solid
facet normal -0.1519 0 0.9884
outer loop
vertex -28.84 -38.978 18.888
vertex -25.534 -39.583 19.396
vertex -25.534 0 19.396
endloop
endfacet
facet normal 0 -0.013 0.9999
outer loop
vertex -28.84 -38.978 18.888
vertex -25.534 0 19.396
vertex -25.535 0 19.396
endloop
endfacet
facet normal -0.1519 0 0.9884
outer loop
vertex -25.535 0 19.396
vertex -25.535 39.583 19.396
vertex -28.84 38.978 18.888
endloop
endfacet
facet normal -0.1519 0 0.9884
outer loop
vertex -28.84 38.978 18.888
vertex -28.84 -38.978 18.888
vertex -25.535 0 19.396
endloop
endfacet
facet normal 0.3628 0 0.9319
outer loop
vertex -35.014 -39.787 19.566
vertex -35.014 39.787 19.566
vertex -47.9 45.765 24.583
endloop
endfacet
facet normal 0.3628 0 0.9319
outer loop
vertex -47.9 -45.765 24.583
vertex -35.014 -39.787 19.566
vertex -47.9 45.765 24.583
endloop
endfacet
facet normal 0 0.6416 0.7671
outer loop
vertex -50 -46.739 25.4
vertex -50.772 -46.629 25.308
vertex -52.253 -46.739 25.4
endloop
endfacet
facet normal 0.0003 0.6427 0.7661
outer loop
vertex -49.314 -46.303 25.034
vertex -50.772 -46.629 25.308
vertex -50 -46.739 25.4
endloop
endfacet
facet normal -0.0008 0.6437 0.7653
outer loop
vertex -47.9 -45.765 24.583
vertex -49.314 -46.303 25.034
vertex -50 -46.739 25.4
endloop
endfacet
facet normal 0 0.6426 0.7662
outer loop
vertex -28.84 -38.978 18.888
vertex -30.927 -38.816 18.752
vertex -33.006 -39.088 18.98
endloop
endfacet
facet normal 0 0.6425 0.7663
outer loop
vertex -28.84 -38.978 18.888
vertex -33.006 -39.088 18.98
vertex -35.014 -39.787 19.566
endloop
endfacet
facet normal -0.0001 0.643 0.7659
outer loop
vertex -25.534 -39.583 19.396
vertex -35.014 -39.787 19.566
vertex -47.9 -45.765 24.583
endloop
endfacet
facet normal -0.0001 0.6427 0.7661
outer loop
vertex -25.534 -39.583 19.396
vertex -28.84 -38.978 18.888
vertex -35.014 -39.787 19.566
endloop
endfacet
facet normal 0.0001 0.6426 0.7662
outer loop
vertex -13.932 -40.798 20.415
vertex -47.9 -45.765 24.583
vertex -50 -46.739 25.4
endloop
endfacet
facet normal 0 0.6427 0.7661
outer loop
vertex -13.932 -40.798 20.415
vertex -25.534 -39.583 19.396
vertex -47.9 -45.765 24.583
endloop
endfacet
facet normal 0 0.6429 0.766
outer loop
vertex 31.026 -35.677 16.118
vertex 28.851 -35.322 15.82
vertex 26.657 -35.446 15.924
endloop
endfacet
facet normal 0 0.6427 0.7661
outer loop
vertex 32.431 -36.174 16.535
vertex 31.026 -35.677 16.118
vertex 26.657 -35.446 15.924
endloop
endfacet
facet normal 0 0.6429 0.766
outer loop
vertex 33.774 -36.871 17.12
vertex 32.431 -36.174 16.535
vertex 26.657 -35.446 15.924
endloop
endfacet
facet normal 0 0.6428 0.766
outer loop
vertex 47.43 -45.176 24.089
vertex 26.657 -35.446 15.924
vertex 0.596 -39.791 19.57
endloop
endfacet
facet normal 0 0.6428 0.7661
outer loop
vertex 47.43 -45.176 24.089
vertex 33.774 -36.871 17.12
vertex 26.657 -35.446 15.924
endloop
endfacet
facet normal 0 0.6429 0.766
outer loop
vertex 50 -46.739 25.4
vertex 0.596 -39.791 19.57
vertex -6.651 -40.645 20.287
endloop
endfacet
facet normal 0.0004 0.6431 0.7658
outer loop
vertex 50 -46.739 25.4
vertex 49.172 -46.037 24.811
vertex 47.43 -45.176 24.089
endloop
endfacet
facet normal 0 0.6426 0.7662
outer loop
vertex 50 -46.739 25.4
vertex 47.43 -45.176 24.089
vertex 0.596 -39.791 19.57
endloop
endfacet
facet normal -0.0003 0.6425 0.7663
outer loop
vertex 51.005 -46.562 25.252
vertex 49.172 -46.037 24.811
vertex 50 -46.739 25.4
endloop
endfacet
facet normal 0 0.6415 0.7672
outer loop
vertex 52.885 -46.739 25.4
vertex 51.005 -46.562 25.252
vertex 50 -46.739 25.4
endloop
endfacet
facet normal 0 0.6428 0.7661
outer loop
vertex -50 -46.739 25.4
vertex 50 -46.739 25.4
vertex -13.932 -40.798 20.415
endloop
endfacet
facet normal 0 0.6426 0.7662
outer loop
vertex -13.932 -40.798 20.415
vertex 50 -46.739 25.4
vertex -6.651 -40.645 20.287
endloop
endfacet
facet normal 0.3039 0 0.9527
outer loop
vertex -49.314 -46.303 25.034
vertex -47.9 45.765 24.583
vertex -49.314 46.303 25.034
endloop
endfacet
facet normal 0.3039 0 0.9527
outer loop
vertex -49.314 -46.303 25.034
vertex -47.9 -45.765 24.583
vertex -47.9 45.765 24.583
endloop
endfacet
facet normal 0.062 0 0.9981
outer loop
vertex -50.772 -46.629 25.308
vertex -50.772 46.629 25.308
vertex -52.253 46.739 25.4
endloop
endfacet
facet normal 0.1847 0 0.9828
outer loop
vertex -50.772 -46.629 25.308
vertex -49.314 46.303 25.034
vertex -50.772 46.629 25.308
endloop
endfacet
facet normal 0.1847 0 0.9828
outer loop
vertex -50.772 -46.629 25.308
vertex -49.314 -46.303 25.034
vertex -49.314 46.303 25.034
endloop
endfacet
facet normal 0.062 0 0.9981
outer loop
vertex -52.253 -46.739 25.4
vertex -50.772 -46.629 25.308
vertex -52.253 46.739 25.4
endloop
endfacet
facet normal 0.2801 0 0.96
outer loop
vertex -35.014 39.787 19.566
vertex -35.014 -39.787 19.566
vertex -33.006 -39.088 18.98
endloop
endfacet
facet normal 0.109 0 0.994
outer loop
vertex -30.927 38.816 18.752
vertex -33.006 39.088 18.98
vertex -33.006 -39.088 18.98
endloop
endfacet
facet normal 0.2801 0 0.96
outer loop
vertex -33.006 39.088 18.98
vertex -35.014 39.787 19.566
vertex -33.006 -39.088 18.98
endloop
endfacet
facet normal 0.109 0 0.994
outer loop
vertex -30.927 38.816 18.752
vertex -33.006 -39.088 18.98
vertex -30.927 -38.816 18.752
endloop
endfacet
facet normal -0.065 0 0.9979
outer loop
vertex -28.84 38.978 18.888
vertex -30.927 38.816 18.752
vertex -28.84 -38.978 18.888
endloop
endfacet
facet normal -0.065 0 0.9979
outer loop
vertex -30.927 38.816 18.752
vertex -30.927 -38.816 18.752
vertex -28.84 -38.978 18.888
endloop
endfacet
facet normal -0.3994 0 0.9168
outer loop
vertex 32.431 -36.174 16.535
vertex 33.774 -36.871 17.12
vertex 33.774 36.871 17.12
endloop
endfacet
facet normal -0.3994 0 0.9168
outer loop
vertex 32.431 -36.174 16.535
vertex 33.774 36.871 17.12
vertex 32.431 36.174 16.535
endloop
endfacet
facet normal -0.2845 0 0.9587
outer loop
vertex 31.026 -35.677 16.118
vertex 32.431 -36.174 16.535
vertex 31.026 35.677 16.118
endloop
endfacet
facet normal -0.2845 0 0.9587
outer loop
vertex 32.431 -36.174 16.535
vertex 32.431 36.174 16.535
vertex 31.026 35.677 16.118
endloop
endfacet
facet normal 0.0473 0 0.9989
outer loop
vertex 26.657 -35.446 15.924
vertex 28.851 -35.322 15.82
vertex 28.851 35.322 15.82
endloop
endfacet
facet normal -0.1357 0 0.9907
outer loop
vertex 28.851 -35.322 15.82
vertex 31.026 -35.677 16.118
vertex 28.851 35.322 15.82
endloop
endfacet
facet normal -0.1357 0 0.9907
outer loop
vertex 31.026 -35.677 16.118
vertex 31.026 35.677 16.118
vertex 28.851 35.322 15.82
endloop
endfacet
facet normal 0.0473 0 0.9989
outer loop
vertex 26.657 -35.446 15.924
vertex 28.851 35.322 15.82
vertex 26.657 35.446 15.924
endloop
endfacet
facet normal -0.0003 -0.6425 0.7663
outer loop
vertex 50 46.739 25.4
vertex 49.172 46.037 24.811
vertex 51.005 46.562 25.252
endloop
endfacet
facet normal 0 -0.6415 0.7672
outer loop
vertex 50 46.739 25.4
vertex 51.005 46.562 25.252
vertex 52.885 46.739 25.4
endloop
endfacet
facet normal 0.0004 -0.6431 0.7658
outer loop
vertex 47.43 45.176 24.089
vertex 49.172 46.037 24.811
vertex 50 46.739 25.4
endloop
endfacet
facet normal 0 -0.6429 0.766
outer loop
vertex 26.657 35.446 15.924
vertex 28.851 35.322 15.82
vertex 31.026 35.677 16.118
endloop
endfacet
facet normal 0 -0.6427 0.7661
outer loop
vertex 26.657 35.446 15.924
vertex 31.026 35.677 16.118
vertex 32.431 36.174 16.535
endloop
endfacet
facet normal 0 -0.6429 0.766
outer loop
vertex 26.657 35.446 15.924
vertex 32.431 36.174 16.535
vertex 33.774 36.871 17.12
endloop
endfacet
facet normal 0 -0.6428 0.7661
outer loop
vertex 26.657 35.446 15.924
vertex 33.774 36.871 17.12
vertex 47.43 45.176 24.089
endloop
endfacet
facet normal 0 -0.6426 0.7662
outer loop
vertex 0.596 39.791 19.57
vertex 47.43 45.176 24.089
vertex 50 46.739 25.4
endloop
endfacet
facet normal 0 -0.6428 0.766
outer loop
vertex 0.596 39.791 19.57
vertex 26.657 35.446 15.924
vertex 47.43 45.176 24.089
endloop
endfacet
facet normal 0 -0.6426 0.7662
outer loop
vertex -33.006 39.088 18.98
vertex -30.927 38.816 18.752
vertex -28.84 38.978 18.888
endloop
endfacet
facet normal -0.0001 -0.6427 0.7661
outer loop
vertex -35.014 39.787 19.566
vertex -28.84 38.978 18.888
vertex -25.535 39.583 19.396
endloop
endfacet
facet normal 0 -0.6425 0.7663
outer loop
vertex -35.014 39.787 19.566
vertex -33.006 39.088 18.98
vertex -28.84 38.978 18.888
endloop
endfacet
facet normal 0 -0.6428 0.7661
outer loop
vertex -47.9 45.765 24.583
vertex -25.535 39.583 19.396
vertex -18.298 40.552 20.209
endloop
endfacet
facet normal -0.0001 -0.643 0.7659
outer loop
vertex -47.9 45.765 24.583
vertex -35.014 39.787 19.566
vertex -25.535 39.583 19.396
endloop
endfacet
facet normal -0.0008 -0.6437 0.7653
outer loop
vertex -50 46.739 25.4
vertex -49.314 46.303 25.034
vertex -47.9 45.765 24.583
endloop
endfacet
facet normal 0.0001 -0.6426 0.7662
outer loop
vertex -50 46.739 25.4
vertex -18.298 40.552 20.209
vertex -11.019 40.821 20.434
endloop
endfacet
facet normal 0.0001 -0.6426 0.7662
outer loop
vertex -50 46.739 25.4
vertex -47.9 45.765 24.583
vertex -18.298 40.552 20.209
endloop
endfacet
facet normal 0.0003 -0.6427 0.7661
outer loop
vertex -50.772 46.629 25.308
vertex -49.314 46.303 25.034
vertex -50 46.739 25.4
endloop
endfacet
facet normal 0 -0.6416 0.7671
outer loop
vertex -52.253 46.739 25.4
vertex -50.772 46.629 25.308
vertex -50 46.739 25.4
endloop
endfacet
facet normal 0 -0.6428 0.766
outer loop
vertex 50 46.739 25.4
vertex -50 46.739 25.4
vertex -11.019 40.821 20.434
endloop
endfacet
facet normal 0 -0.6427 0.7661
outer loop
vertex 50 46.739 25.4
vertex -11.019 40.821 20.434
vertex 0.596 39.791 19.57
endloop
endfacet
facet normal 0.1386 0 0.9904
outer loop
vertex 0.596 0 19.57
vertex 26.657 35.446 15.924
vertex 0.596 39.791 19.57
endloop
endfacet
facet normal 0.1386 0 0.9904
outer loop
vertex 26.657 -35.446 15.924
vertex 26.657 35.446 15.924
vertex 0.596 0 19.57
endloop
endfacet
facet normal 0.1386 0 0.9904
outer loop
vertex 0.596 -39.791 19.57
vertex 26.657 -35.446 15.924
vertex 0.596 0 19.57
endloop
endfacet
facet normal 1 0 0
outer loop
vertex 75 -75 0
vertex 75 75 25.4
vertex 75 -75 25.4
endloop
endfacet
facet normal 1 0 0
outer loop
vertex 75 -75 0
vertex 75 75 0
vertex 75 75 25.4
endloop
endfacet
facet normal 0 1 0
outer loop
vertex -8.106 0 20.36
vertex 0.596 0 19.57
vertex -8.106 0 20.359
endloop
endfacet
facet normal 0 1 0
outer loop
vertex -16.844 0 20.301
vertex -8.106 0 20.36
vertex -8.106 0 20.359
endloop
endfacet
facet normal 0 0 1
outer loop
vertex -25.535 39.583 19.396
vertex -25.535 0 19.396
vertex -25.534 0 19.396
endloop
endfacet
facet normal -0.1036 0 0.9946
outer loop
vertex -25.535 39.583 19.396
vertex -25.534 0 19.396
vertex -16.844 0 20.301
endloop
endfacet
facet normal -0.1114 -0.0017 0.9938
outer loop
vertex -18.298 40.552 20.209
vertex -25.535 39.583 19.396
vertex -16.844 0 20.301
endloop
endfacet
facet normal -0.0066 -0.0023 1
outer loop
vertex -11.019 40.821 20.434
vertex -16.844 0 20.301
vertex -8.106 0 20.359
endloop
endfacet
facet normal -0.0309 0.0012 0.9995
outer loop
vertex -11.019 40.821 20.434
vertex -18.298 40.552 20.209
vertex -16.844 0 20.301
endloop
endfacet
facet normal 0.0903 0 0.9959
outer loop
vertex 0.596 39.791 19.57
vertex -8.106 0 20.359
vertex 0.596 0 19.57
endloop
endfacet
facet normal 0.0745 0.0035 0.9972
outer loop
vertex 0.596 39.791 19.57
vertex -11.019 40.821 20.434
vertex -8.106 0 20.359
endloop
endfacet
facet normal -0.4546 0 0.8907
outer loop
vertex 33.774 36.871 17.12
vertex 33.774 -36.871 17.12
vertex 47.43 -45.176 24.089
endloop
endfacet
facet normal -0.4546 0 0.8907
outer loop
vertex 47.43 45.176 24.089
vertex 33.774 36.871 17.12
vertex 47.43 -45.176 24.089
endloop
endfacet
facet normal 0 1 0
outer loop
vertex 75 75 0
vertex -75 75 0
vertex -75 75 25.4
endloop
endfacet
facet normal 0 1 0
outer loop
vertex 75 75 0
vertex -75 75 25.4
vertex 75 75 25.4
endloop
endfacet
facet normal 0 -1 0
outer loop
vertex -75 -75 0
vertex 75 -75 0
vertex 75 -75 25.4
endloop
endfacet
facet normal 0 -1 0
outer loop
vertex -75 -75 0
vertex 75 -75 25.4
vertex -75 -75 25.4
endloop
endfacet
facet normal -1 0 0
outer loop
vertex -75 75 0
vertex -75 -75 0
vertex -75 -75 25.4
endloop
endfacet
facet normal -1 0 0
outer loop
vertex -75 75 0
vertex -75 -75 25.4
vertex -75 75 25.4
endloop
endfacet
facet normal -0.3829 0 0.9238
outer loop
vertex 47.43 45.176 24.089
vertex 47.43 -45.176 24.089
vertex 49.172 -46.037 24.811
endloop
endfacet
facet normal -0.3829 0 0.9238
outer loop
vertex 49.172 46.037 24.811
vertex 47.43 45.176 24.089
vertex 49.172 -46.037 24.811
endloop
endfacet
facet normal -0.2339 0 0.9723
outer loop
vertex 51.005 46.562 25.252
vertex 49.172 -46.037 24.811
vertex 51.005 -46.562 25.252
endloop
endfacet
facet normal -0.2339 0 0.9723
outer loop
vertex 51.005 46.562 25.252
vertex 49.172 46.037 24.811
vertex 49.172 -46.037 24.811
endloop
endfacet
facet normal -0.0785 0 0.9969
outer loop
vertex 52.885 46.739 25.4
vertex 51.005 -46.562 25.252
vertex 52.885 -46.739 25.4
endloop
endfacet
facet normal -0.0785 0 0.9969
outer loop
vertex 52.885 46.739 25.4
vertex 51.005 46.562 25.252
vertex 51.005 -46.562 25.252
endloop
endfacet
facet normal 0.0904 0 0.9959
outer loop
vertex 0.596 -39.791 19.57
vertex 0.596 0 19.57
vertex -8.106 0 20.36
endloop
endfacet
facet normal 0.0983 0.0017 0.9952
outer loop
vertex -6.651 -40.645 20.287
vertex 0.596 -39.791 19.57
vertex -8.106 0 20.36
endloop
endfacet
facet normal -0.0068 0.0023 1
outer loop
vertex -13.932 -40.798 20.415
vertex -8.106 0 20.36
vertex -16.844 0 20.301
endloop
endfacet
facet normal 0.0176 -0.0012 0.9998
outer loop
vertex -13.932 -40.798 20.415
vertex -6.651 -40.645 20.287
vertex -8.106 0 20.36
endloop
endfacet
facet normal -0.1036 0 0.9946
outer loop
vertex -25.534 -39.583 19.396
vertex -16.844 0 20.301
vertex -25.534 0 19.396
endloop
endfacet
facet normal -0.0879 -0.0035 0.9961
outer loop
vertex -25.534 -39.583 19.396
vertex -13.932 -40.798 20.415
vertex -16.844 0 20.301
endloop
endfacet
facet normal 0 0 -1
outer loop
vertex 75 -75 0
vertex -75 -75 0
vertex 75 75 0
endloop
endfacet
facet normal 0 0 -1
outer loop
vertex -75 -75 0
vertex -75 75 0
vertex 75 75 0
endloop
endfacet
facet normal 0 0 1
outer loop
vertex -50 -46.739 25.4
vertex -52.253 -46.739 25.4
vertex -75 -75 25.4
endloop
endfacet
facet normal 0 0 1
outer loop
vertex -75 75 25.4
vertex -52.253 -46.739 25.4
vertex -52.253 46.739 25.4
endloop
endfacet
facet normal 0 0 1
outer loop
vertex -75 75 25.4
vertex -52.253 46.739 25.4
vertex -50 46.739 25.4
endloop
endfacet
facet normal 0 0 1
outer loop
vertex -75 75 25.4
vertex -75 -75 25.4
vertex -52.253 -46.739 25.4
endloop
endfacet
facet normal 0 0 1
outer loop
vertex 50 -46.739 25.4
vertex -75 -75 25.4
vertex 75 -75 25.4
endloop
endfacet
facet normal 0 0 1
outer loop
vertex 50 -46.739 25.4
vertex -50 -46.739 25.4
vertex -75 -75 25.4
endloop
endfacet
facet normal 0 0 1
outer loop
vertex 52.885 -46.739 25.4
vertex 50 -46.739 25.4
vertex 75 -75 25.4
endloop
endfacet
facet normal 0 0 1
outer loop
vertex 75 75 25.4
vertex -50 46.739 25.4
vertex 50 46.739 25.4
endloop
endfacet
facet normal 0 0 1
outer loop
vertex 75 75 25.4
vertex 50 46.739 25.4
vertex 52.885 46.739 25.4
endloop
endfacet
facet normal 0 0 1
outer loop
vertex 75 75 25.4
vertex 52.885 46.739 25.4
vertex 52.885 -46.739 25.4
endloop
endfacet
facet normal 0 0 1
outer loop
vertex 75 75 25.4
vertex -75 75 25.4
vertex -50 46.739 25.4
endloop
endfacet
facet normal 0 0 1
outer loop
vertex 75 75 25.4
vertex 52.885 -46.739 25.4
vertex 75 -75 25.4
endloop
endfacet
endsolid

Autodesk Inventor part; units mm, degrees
sketch "Boceto1" plane through (0, 0, 0) normal (0, 0, 1) x (1, 0, 0)
  line L0 (-75, 75) -> (75, 75)
  line L1 (75, 75) -> (75, -75)
  line L2 (75, -75) -> (-75, -75)
  line L3 (-75, -75) -> (-75, 75)
  line L4 (-75, 75) -> (75, -75) construction
  line L5 (75, 75) -> (-75, -75) construction
  point P0 (0, 0)
  dimension "d0" = 150
  dimension "d1" = 150
extrude "Extrusión1" add sketch "Boceto1" along normal blind 25.4
sketch "Boceto2" plane through (0, 0, 0) normal (0, 1, 0) x (-1, 0, 0)
  line L0 (-75, 25.4) -> (75, 25.4) projected
  line L1 (0, 25.4) -> (-45.0693, 25.4)
  line L2 (-45.0693, 25.4) -> (-30.9272, 25.4) construction
  line L3 (-30.4041, 15.4) -> (12.482, 21.4)
  line L4 (12.482, 21.4) -> (32.0178, 18.4)
  line L5 (0, 25.4) -> (45.9037, 25.4)
  line L6 (-30.4041, 15.4) -> (-50, 25.4)
  line L7 (-45.0693, 25.4) -> (-50, 25.4)
  line L8 (-75, 0) -> (-75, 25.4) projected
  line L9 (32.0178, 18.4) -> (50, 25.4)
  line L10 (50, 25.4) -> (45.9037, 25.4)
  line L11 (75, 0) -> (75, 25.4) projected
  point P0 (0, 0)
  dimension "d33" = 4
  dimension "d34" = 7
  dimension "d35" = 10
  dimension "d36" = 22
  dimension "d41" = 150
  dimension "d42" = 145
  dimension "d45" = 100
  dimension "d46" = 25
  dimension "d47" = 25
extrude "Extrusión2" cut sketch "Boceto2" along normal blind 35
fillet "Empalme2" radius 90 1 edges at (-12.482, 17.5, 21.4)
chamfer "Chaflán1" distance 9.85 angle 50 1 edges at (0, 35, 25.4)
mirror "Simetría1" about plane through (0, 0, 0) normal (0, 1, 0) of "Extrusión2", "Empalme2", "Chaflán1"
fillet "Empalme15" radius 12 2 edges at (-32.0178, 0, 18.4) (30.4041, 0, 15.4)
fillet "Empalme16" radius 12 2 edges at (-50, 0, 25.4) (50, 0, 25.4)
properties part number "Placa - Abrasión punto Silla"
